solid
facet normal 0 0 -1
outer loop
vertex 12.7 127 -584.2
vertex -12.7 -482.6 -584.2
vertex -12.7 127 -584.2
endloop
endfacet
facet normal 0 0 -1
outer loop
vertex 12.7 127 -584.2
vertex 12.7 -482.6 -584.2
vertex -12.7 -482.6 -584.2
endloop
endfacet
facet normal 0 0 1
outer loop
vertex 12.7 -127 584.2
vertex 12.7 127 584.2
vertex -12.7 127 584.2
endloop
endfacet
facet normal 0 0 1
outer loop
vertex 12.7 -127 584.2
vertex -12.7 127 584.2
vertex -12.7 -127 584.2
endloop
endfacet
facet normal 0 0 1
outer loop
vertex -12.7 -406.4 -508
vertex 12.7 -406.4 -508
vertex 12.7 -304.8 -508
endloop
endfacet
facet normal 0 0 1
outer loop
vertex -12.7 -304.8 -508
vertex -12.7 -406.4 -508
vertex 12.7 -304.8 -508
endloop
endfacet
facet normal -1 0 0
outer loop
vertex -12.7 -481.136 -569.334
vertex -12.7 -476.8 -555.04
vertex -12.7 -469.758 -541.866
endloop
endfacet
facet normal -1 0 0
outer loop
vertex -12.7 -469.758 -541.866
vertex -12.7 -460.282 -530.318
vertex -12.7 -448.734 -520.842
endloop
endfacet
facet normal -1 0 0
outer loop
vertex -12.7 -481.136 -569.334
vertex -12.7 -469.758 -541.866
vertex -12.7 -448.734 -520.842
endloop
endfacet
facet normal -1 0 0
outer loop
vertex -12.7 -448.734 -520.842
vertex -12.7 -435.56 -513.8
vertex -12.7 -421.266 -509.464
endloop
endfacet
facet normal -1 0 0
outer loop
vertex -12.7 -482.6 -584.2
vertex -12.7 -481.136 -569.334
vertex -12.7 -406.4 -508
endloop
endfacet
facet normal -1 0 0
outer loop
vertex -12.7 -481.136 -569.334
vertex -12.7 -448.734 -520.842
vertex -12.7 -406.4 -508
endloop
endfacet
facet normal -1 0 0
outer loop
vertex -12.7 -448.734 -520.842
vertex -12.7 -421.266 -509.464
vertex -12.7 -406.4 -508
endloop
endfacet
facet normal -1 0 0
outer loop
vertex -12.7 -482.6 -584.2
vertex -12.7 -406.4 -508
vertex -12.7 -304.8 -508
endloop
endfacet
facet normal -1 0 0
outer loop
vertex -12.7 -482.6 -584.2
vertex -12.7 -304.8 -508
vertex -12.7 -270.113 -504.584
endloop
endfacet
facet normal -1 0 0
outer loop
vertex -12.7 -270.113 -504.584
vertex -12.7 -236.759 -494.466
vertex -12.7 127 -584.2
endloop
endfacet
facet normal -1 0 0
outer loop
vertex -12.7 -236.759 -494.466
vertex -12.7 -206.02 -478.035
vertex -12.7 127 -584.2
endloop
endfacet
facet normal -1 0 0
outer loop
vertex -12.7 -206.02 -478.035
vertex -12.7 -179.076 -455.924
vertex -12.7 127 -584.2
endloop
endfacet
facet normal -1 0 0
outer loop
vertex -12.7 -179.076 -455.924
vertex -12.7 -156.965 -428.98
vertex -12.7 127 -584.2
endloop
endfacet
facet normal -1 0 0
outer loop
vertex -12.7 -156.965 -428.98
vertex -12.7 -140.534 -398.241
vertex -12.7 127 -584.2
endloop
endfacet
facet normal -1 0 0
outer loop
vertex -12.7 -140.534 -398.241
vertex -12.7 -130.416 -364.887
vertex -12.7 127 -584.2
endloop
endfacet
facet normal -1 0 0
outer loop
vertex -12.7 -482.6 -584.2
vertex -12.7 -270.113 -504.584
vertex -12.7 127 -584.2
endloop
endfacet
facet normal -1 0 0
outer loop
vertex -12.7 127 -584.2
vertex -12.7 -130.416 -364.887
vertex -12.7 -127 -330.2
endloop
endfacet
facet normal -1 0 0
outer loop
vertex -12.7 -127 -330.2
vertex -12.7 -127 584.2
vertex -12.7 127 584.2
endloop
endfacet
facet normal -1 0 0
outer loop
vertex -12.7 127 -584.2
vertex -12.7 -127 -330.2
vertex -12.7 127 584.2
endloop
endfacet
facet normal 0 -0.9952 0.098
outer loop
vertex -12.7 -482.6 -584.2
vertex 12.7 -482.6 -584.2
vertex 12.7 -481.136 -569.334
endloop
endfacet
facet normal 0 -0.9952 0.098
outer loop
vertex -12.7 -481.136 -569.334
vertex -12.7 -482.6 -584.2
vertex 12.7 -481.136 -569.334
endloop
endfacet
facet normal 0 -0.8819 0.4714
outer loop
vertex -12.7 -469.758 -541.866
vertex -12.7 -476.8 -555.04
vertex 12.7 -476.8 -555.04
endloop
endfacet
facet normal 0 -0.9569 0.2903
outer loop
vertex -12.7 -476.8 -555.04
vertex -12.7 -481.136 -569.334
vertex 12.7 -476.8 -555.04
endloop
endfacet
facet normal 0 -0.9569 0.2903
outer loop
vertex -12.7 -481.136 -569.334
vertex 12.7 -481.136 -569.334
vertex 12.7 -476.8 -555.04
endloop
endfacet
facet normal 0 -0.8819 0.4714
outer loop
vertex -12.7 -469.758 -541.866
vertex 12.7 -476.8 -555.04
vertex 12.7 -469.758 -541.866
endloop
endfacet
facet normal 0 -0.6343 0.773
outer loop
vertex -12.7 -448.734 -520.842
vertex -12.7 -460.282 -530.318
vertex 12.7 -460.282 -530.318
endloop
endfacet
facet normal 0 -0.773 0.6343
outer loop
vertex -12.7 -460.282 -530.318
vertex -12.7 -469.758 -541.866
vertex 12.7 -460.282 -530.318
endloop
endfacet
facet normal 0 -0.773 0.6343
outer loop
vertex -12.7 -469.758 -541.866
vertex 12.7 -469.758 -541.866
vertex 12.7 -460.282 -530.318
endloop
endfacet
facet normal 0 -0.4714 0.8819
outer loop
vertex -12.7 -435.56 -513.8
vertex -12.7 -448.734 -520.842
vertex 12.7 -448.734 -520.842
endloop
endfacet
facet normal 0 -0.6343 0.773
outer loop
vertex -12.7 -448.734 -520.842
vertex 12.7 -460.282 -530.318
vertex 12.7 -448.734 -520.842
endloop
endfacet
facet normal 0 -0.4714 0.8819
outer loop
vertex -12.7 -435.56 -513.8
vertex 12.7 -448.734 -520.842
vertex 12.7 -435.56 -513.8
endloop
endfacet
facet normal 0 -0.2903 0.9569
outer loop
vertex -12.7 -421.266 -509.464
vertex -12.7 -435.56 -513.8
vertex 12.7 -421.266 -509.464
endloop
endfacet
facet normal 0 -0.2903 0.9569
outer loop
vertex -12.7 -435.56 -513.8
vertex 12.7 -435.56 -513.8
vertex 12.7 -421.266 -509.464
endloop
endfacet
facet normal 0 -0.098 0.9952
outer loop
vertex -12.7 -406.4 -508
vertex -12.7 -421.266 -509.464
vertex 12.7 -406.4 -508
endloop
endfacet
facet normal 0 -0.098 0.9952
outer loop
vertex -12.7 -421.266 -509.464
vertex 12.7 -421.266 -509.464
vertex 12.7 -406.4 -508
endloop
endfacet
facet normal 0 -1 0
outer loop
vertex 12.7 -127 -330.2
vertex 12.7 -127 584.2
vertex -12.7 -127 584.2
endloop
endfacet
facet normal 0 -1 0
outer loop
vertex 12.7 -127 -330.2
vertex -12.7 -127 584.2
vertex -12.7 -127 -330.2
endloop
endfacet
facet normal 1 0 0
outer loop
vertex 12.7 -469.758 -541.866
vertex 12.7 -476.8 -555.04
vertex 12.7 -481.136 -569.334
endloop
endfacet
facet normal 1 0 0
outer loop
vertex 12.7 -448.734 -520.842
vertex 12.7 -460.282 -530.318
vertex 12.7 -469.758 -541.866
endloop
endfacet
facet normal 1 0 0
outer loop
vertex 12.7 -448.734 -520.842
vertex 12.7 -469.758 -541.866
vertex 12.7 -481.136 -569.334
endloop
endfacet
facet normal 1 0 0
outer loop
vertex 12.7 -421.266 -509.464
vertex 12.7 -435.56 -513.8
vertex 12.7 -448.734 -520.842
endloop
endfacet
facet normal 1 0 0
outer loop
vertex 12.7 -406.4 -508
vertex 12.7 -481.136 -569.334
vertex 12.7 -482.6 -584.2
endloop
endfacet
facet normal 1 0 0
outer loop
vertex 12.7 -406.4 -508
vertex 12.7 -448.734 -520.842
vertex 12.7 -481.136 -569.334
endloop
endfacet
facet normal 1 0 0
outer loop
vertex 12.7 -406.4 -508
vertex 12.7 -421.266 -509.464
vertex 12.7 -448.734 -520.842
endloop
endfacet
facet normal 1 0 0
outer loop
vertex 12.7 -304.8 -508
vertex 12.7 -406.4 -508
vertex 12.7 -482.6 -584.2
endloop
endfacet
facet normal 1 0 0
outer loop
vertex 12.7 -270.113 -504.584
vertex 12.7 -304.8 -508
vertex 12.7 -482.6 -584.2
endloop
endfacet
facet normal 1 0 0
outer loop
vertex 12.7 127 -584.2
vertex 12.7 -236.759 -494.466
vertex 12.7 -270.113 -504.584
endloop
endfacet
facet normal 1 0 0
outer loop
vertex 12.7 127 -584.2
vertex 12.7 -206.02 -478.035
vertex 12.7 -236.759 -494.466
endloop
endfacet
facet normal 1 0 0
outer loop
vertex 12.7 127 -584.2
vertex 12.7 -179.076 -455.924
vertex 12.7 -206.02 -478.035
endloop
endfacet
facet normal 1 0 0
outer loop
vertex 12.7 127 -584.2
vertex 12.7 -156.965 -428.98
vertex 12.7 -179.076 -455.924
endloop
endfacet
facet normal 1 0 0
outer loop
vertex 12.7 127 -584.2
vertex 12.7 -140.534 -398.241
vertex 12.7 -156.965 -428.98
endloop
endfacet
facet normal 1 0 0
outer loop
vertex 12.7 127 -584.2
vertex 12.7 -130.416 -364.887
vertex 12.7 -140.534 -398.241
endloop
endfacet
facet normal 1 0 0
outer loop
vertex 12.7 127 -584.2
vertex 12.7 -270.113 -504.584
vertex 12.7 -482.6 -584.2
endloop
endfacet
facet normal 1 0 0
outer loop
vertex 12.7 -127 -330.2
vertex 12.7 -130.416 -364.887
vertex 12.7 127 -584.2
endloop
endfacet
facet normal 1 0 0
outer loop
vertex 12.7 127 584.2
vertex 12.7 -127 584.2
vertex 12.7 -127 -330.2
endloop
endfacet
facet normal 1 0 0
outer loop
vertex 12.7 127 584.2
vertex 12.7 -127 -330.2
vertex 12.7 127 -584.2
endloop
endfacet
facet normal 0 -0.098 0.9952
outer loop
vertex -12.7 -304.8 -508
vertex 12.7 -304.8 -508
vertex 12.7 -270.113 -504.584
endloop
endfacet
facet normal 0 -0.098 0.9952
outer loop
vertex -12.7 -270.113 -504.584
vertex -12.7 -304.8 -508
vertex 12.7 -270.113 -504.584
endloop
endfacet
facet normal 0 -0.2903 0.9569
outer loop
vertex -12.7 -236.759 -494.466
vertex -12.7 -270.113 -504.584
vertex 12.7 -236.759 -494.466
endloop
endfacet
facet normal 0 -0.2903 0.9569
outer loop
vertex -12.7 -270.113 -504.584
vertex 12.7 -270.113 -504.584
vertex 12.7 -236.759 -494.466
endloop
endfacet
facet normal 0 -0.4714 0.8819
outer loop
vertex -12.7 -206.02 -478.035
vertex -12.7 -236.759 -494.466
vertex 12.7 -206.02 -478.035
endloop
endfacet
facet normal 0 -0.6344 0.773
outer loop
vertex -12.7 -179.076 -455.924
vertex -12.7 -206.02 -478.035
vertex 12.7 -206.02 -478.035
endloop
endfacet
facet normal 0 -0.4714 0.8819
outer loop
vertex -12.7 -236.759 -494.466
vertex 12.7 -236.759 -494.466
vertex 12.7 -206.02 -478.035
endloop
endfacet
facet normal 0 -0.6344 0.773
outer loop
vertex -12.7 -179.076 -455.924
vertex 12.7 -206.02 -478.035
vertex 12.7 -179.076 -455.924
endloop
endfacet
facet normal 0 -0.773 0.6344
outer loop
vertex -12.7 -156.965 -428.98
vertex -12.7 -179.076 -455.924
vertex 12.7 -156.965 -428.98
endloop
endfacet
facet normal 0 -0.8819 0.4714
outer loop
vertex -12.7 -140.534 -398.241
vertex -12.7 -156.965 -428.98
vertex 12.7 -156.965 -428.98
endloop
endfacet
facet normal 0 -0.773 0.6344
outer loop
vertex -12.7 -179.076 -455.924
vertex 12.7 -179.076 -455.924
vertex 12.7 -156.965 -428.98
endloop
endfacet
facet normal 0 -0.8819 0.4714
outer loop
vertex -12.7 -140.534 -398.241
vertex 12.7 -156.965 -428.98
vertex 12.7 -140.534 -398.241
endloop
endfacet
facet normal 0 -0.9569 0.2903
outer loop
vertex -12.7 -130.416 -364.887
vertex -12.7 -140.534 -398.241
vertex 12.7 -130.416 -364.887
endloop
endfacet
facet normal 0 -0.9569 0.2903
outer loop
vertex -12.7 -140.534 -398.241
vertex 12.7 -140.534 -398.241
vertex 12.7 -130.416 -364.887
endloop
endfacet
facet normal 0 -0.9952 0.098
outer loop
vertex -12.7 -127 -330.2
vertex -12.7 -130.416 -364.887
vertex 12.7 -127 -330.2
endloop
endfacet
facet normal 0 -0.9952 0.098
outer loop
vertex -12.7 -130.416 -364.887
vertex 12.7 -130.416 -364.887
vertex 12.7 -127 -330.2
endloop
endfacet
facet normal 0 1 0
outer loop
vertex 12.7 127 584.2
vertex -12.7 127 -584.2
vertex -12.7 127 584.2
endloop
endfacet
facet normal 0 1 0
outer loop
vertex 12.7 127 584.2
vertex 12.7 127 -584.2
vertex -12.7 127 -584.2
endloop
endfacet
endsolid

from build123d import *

# Parameters (mm, degrees)
F0_W     = 355.6
F0_H     = 254
F1_DEPTH = 12.7
F3_DEPTH = 25.401


with BuildPart() as f1:
    # F0 (on Right) → F1 (new body, symmetric)
    with BuildSketch(Plane.YZ):
        Polygon((127, -584.2), (127, 584.2), (-127, 584.2), (-127, -330.2), (-127, -584.2), align=None)
        with Locations((-304.8, -457.2)):
            Rectangle(F0_W, F0_H)
    extrude(amount=F1_DEPTH, both=True)

    # F2 (on face) → F3 (cut, through all)
    with BuildSketch(Plane.YZ.offset(12.7)):
        with BuildLine():
            ThreePointArc((-304.8, -508), (-179.076414305, -455.923585695), (-127, -330.2))
            Line((-127, -330.2), (-482.6, -330.2))
            Line((-482.6, -330.2), (-482.6, -584.2))
            ThreePointArc((-482.6, -584.2), (-460.2815367264, -530.3184632736), (-406.4, -508))
            Line((-406.4, -508), (-304.8, -508))
        make_face()
    extrude(amount=-F3_DEPTH, mode=Mode.SUBTRACT)


solid = f1.part
